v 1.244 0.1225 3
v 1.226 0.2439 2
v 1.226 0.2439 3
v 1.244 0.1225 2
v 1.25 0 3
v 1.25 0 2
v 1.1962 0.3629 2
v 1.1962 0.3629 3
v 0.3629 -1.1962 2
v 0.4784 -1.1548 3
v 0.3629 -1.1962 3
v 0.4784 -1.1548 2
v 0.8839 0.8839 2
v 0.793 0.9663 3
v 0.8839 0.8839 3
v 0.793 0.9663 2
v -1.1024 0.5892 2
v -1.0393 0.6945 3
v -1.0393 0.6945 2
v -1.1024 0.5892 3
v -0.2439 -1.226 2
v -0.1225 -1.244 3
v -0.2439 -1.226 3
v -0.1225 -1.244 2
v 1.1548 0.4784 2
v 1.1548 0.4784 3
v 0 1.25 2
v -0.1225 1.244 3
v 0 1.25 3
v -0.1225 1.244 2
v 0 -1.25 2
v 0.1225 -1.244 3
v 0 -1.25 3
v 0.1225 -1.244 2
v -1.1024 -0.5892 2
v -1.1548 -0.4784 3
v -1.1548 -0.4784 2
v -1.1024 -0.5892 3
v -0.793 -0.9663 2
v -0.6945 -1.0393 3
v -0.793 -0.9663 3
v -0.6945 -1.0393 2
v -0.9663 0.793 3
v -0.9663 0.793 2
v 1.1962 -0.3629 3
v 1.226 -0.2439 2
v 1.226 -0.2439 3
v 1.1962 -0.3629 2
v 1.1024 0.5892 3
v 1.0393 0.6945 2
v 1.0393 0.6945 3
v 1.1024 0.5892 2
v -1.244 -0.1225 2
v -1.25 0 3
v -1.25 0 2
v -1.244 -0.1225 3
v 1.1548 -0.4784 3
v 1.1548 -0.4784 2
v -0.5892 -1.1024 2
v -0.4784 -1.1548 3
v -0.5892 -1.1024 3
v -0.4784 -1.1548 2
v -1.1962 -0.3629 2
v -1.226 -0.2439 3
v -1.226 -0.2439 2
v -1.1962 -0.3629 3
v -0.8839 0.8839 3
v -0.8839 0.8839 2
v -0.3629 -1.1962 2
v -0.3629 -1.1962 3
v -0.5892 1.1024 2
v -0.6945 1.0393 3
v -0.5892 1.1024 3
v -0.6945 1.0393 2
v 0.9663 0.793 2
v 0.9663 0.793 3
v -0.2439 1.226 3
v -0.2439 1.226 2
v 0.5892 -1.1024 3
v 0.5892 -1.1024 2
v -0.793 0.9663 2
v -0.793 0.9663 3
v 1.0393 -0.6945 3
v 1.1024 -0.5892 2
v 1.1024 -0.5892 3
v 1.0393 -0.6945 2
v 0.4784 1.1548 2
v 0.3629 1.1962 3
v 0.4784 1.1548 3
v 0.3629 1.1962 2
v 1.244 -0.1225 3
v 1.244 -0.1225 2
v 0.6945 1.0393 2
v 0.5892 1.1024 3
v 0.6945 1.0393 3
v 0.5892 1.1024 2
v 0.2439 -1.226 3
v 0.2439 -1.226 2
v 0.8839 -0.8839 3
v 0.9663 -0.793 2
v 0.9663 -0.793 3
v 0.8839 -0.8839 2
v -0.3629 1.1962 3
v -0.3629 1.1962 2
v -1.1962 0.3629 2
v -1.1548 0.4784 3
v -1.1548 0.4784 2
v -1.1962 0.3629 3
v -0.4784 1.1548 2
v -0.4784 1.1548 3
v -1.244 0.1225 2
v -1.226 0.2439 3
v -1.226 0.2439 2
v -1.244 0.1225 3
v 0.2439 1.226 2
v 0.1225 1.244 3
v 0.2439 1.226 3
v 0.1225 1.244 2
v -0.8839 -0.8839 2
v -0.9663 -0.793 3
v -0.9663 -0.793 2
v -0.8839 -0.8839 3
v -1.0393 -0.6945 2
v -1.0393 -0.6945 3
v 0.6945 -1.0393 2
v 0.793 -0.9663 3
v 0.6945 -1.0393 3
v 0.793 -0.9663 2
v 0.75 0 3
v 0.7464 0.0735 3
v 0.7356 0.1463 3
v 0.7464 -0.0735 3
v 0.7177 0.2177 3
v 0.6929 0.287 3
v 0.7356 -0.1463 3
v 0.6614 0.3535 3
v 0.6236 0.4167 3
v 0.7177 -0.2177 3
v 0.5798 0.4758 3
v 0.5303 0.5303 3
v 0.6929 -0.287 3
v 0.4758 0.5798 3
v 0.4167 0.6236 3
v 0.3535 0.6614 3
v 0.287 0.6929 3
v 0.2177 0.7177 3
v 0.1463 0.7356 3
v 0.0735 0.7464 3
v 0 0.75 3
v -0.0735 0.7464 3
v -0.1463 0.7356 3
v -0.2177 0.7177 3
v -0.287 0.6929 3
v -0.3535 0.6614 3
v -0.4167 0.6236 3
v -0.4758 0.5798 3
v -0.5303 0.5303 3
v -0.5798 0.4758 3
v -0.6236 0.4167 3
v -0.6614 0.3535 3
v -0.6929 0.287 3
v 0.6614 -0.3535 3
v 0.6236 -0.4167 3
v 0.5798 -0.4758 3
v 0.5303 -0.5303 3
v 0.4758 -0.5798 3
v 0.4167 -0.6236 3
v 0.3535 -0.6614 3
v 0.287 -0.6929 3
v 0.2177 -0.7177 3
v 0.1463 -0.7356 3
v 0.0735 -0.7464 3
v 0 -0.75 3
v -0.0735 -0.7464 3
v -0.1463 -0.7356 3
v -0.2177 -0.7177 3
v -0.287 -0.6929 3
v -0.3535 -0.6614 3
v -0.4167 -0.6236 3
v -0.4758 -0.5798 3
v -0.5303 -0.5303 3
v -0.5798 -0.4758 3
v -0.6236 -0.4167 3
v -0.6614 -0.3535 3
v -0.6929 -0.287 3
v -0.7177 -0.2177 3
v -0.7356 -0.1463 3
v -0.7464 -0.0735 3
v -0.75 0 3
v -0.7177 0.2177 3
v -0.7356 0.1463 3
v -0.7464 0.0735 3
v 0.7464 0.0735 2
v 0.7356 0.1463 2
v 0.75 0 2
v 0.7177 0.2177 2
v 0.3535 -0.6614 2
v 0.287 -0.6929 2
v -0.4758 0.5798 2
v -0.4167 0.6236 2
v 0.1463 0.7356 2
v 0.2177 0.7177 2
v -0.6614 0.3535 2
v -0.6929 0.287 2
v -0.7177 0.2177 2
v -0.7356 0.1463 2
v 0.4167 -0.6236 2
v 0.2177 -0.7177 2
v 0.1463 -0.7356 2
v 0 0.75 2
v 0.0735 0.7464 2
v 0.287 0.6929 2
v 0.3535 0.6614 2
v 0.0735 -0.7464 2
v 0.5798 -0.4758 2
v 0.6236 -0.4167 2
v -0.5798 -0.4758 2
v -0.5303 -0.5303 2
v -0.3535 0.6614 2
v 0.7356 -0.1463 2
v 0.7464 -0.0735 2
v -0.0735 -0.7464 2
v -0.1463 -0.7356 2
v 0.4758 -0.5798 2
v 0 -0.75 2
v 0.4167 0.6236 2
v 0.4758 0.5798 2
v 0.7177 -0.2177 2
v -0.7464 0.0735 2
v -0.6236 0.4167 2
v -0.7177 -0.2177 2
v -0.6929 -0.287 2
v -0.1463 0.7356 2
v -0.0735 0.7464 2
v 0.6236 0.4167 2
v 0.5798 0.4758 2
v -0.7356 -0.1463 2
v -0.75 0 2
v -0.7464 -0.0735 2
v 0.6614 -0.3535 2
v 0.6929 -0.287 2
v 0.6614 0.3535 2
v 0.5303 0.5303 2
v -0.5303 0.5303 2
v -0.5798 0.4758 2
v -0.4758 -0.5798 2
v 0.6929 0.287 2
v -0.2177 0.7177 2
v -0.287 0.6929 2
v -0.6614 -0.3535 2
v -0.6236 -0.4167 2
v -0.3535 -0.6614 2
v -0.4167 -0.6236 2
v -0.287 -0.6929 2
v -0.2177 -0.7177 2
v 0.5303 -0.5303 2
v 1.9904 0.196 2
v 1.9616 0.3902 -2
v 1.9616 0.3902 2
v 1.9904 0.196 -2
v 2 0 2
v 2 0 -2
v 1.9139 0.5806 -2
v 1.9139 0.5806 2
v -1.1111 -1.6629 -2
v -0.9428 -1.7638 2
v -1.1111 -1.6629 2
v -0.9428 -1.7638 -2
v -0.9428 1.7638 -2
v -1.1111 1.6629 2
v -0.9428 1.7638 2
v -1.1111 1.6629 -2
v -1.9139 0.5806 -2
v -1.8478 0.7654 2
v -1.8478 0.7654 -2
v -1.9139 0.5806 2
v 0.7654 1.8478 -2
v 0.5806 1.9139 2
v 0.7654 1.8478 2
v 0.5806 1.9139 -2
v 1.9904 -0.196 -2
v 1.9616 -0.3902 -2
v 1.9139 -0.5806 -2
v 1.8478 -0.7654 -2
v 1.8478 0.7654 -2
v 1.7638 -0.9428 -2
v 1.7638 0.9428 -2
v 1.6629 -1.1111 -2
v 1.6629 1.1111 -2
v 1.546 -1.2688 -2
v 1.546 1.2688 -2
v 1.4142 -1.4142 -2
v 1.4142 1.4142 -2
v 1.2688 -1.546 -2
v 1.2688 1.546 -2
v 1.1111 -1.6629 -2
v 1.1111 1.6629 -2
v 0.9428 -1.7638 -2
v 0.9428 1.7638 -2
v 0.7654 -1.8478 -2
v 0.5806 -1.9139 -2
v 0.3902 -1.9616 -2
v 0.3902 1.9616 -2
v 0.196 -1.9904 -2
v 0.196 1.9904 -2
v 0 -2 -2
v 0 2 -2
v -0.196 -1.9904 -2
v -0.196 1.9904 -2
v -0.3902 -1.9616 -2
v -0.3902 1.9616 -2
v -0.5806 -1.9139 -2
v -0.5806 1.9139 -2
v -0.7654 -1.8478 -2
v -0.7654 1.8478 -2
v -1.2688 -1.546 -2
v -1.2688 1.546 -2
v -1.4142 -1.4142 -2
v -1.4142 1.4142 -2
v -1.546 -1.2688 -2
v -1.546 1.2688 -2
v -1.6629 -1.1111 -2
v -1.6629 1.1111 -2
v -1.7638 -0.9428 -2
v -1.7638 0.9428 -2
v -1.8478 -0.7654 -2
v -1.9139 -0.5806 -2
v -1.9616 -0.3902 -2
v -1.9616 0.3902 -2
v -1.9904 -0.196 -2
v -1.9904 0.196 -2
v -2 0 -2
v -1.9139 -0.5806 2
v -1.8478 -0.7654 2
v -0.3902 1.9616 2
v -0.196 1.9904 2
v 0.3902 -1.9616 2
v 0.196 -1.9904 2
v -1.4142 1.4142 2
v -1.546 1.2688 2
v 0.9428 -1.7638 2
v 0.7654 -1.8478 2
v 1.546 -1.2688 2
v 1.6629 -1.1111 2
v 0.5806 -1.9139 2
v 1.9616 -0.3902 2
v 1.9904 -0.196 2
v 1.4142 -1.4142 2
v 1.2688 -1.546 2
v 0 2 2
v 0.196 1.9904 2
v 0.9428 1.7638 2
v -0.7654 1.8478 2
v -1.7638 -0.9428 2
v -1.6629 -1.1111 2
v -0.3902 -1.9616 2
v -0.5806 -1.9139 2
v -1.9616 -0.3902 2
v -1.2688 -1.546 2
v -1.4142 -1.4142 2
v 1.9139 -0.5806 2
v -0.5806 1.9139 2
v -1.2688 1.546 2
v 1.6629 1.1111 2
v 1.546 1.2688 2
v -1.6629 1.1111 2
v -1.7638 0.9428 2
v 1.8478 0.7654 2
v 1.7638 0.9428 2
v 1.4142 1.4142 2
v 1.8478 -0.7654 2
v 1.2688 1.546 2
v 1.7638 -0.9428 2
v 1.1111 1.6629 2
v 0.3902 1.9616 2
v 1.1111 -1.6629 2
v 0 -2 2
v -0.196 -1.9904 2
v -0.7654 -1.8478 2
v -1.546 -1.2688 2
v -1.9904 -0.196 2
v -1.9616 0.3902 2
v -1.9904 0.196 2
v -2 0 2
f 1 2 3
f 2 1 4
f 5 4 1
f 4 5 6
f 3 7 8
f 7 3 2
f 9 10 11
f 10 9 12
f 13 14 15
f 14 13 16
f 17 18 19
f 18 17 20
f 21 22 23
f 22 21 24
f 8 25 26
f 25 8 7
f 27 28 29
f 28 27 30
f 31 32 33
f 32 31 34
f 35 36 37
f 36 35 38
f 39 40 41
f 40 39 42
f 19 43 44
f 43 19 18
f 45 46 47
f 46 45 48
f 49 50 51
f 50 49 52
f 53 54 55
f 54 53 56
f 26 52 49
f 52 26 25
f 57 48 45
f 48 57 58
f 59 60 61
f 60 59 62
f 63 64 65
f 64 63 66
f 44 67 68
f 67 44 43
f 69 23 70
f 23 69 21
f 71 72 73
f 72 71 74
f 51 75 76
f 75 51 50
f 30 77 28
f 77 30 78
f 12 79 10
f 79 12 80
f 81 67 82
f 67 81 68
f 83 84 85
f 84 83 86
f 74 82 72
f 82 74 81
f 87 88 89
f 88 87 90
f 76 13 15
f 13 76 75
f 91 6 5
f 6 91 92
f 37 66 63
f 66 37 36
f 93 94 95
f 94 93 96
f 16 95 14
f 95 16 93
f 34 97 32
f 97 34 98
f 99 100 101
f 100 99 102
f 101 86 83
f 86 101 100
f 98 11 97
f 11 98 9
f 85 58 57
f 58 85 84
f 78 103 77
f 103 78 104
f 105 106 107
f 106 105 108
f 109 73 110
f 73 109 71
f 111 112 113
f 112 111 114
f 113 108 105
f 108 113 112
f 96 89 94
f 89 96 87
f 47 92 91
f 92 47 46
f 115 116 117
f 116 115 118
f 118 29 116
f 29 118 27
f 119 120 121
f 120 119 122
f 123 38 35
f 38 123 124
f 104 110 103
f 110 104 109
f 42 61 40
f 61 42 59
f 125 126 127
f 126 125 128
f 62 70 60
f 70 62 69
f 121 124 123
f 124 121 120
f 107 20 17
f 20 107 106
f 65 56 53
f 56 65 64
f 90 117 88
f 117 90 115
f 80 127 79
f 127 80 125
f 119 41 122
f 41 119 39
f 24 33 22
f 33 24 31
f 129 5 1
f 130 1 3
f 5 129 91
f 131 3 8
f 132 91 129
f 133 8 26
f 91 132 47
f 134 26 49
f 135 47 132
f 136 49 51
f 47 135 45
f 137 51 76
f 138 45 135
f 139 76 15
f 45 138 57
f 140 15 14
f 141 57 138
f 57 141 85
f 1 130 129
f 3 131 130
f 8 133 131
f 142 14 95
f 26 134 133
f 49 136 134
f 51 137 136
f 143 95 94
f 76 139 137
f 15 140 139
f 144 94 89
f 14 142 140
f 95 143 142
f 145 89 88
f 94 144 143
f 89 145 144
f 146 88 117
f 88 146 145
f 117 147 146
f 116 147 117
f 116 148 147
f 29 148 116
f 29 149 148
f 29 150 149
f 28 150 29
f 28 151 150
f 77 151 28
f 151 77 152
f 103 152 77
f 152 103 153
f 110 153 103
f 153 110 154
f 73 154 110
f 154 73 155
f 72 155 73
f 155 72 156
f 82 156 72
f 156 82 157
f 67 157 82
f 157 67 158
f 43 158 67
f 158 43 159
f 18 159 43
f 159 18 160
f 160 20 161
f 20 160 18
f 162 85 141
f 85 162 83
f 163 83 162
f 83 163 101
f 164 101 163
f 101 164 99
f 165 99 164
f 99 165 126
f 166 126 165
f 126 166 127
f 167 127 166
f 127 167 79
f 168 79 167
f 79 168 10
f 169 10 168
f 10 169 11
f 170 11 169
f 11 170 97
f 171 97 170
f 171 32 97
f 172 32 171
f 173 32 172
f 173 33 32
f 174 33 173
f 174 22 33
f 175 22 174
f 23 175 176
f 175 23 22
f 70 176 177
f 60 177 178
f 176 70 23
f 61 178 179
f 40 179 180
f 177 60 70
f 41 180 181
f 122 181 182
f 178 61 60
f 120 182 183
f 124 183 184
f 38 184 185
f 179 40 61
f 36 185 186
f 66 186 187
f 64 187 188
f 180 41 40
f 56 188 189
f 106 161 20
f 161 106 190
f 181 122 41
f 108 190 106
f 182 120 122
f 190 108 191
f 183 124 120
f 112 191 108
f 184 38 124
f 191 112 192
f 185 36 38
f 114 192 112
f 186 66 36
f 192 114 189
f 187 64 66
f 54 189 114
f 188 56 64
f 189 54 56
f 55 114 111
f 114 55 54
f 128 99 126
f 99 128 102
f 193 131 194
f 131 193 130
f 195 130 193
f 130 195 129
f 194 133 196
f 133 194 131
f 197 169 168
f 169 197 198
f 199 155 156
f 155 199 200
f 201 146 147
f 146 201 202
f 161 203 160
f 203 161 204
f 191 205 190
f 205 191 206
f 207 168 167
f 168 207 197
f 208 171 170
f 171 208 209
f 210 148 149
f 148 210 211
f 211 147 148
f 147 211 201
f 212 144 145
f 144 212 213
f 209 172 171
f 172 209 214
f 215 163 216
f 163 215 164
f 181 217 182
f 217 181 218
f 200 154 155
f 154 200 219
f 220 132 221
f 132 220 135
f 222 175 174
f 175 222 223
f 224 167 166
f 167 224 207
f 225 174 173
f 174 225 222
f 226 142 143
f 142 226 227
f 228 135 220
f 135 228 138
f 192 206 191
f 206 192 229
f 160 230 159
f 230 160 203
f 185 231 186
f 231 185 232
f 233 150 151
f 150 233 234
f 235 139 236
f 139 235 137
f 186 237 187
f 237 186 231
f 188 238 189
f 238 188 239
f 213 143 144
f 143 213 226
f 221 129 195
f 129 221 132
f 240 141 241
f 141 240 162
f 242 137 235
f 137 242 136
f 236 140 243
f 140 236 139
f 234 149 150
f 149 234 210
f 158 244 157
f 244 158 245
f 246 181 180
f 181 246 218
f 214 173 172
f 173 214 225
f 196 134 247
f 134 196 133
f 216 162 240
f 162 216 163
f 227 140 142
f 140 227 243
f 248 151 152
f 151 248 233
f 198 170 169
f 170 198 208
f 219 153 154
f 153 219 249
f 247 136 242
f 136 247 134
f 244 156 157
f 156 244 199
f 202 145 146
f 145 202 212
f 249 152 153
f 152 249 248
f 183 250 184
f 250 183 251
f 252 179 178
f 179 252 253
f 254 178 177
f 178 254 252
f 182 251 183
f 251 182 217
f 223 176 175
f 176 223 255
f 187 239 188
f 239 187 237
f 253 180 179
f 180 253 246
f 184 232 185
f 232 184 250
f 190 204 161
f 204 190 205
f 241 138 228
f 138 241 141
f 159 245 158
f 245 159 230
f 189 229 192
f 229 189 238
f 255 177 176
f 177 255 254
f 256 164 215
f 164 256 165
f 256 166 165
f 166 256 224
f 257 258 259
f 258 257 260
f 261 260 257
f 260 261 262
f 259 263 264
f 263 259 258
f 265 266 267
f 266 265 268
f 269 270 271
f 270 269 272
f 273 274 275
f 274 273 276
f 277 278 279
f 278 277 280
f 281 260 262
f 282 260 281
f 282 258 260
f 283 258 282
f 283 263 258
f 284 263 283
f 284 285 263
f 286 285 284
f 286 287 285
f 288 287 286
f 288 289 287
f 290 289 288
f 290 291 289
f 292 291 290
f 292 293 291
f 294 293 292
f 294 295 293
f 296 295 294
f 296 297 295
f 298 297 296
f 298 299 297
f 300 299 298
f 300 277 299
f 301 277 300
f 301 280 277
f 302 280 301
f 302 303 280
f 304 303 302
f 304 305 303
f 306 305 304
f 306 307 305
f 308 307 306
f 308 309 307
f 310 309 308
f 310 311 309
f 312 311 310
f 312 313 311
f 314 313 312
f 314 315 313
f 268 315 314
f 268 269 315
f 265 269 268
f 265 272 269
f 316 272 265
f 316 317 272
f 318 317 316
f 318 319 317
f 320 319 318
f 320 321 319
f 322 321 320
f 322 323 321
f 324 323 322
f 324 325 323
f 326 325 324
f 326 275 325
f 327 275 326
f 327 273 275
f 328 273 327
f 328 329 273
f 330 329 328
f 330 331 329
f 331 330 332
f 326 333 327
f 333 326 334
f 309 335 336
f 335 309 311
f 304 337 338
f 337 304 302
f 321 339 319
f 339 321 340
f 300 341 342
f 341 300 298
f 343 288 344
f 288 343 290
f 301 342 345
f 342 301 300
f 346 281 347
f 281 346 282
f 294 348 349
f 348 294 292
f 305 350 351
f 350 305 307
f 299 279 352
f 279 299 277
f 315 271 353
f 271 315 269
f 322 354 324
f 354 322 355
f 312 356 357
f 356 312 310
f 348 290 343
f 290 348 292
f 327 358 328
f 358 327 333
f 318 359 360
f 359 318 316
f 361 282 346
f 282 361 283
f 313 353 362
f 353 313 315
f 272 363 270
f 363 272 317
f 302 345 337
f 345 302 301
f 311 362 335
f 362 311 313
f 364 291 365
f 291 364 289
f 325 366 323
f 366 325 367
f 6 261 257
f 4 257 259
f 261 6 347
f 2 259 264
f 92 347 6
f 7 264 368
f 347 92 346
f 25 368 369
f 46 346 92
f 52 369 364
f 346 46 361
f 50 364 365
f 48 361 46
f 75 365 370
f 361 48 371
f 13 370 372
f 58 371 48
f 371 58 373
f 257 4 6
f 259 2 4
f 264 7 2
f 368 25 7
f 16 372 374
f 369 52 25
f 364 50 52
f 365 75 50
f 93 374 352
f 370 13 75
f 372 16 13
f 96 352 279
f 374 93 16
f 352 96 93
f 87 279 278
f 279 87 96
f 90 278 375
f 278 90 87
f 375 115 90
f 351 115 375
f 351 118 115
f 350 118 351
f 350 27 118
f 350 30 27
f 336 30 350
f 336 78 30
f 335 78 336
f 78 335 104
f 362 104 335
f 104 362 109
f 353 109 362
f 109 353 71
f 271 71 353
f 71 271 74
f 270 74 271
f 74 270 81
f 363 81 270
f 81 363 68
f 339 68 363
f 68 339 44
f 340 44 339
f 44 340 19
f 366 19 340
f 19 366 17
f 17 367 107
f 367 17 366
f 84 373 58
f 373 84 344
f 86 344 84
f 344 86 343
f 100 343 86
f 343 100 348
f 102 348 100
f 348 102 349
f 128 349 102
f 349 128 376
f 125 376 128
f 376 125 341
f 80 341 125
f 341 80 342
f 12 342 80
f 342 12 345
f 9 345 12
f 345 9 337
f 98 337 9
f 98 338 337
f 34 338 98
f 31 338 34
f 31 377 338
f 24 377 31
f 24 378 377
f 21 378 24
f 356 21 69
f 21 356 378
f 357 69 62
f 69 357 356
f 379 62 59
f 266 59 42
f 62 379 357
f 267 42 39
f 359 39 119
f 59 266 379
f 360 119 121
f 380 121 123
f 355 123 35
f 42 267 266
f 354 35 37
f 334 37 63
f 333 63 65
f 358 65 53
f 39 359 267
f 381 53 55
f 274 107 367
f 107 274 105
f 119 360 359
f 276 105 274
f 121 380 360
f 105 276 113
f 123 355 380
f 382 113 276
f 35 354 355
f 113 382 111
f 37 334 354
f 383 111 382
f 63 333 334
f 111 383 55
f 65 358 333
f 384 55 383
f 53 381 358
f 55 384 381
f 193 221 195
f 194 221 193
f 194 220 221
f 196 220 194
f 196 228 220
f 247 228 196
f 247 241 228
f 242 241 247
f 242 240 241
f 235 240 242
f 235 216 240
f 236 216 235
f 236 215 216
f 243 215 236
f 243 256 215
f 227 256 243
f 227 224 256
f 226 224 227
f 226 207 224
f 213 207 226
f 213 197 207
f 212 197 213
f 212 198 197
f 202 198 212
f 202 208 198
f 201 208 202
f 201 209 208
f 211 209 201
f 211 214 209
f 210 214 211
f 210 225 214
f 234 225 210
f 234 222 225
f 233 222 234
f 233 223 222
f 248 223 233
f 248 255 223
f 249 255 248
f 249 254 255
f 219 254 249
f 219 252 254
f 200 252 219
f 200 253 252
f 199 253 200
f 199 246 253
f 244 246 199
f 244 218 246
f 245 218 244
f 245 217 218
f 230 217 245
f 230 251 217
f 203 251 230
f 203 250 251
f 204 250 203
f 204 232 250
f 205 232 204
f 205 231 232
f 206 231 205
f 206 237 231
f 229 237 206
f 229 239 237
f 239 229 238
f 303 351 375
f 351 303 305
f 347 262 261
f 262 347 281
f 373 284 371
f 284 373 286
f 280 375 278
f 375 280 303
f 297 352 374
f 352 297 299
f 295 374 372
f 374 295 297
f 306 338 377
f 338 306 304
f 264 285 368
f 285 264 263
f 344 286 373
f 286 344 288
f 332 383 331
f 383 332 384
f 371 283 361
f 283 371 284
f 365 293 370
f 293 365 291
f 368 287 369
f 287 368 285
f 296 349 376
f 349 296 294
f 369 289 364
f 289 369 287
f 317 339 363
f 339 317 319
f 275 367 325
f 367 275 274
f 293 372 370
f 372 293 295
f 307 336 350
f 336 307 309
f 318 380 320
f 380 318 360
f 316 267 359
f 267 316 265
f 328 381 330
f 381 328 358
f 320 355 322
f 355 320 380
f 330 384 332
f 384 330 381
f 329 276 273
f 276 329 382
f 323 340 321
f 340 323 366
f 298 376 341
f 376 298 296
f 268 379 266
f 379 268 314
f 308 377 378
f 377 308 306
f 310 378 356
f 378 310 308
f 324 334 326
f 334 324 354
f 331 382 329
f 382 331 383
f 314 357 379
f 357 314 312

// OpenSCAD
module grub_screw() {
    $fn = 64;
    // Main body of the screw
    cylinder(h = 4, d = 4, center = true);
    
    // Hex socket
    translate([0, 0, 2])
        difference() {
            cylinder(h = 2, d = 2.5, center = true);
            rotate([0, 0, 0])
                translate([0, 0, -1])
                    cylinder(h = 4, d = 1.5, center = true);
        }
}

grub_screw();
